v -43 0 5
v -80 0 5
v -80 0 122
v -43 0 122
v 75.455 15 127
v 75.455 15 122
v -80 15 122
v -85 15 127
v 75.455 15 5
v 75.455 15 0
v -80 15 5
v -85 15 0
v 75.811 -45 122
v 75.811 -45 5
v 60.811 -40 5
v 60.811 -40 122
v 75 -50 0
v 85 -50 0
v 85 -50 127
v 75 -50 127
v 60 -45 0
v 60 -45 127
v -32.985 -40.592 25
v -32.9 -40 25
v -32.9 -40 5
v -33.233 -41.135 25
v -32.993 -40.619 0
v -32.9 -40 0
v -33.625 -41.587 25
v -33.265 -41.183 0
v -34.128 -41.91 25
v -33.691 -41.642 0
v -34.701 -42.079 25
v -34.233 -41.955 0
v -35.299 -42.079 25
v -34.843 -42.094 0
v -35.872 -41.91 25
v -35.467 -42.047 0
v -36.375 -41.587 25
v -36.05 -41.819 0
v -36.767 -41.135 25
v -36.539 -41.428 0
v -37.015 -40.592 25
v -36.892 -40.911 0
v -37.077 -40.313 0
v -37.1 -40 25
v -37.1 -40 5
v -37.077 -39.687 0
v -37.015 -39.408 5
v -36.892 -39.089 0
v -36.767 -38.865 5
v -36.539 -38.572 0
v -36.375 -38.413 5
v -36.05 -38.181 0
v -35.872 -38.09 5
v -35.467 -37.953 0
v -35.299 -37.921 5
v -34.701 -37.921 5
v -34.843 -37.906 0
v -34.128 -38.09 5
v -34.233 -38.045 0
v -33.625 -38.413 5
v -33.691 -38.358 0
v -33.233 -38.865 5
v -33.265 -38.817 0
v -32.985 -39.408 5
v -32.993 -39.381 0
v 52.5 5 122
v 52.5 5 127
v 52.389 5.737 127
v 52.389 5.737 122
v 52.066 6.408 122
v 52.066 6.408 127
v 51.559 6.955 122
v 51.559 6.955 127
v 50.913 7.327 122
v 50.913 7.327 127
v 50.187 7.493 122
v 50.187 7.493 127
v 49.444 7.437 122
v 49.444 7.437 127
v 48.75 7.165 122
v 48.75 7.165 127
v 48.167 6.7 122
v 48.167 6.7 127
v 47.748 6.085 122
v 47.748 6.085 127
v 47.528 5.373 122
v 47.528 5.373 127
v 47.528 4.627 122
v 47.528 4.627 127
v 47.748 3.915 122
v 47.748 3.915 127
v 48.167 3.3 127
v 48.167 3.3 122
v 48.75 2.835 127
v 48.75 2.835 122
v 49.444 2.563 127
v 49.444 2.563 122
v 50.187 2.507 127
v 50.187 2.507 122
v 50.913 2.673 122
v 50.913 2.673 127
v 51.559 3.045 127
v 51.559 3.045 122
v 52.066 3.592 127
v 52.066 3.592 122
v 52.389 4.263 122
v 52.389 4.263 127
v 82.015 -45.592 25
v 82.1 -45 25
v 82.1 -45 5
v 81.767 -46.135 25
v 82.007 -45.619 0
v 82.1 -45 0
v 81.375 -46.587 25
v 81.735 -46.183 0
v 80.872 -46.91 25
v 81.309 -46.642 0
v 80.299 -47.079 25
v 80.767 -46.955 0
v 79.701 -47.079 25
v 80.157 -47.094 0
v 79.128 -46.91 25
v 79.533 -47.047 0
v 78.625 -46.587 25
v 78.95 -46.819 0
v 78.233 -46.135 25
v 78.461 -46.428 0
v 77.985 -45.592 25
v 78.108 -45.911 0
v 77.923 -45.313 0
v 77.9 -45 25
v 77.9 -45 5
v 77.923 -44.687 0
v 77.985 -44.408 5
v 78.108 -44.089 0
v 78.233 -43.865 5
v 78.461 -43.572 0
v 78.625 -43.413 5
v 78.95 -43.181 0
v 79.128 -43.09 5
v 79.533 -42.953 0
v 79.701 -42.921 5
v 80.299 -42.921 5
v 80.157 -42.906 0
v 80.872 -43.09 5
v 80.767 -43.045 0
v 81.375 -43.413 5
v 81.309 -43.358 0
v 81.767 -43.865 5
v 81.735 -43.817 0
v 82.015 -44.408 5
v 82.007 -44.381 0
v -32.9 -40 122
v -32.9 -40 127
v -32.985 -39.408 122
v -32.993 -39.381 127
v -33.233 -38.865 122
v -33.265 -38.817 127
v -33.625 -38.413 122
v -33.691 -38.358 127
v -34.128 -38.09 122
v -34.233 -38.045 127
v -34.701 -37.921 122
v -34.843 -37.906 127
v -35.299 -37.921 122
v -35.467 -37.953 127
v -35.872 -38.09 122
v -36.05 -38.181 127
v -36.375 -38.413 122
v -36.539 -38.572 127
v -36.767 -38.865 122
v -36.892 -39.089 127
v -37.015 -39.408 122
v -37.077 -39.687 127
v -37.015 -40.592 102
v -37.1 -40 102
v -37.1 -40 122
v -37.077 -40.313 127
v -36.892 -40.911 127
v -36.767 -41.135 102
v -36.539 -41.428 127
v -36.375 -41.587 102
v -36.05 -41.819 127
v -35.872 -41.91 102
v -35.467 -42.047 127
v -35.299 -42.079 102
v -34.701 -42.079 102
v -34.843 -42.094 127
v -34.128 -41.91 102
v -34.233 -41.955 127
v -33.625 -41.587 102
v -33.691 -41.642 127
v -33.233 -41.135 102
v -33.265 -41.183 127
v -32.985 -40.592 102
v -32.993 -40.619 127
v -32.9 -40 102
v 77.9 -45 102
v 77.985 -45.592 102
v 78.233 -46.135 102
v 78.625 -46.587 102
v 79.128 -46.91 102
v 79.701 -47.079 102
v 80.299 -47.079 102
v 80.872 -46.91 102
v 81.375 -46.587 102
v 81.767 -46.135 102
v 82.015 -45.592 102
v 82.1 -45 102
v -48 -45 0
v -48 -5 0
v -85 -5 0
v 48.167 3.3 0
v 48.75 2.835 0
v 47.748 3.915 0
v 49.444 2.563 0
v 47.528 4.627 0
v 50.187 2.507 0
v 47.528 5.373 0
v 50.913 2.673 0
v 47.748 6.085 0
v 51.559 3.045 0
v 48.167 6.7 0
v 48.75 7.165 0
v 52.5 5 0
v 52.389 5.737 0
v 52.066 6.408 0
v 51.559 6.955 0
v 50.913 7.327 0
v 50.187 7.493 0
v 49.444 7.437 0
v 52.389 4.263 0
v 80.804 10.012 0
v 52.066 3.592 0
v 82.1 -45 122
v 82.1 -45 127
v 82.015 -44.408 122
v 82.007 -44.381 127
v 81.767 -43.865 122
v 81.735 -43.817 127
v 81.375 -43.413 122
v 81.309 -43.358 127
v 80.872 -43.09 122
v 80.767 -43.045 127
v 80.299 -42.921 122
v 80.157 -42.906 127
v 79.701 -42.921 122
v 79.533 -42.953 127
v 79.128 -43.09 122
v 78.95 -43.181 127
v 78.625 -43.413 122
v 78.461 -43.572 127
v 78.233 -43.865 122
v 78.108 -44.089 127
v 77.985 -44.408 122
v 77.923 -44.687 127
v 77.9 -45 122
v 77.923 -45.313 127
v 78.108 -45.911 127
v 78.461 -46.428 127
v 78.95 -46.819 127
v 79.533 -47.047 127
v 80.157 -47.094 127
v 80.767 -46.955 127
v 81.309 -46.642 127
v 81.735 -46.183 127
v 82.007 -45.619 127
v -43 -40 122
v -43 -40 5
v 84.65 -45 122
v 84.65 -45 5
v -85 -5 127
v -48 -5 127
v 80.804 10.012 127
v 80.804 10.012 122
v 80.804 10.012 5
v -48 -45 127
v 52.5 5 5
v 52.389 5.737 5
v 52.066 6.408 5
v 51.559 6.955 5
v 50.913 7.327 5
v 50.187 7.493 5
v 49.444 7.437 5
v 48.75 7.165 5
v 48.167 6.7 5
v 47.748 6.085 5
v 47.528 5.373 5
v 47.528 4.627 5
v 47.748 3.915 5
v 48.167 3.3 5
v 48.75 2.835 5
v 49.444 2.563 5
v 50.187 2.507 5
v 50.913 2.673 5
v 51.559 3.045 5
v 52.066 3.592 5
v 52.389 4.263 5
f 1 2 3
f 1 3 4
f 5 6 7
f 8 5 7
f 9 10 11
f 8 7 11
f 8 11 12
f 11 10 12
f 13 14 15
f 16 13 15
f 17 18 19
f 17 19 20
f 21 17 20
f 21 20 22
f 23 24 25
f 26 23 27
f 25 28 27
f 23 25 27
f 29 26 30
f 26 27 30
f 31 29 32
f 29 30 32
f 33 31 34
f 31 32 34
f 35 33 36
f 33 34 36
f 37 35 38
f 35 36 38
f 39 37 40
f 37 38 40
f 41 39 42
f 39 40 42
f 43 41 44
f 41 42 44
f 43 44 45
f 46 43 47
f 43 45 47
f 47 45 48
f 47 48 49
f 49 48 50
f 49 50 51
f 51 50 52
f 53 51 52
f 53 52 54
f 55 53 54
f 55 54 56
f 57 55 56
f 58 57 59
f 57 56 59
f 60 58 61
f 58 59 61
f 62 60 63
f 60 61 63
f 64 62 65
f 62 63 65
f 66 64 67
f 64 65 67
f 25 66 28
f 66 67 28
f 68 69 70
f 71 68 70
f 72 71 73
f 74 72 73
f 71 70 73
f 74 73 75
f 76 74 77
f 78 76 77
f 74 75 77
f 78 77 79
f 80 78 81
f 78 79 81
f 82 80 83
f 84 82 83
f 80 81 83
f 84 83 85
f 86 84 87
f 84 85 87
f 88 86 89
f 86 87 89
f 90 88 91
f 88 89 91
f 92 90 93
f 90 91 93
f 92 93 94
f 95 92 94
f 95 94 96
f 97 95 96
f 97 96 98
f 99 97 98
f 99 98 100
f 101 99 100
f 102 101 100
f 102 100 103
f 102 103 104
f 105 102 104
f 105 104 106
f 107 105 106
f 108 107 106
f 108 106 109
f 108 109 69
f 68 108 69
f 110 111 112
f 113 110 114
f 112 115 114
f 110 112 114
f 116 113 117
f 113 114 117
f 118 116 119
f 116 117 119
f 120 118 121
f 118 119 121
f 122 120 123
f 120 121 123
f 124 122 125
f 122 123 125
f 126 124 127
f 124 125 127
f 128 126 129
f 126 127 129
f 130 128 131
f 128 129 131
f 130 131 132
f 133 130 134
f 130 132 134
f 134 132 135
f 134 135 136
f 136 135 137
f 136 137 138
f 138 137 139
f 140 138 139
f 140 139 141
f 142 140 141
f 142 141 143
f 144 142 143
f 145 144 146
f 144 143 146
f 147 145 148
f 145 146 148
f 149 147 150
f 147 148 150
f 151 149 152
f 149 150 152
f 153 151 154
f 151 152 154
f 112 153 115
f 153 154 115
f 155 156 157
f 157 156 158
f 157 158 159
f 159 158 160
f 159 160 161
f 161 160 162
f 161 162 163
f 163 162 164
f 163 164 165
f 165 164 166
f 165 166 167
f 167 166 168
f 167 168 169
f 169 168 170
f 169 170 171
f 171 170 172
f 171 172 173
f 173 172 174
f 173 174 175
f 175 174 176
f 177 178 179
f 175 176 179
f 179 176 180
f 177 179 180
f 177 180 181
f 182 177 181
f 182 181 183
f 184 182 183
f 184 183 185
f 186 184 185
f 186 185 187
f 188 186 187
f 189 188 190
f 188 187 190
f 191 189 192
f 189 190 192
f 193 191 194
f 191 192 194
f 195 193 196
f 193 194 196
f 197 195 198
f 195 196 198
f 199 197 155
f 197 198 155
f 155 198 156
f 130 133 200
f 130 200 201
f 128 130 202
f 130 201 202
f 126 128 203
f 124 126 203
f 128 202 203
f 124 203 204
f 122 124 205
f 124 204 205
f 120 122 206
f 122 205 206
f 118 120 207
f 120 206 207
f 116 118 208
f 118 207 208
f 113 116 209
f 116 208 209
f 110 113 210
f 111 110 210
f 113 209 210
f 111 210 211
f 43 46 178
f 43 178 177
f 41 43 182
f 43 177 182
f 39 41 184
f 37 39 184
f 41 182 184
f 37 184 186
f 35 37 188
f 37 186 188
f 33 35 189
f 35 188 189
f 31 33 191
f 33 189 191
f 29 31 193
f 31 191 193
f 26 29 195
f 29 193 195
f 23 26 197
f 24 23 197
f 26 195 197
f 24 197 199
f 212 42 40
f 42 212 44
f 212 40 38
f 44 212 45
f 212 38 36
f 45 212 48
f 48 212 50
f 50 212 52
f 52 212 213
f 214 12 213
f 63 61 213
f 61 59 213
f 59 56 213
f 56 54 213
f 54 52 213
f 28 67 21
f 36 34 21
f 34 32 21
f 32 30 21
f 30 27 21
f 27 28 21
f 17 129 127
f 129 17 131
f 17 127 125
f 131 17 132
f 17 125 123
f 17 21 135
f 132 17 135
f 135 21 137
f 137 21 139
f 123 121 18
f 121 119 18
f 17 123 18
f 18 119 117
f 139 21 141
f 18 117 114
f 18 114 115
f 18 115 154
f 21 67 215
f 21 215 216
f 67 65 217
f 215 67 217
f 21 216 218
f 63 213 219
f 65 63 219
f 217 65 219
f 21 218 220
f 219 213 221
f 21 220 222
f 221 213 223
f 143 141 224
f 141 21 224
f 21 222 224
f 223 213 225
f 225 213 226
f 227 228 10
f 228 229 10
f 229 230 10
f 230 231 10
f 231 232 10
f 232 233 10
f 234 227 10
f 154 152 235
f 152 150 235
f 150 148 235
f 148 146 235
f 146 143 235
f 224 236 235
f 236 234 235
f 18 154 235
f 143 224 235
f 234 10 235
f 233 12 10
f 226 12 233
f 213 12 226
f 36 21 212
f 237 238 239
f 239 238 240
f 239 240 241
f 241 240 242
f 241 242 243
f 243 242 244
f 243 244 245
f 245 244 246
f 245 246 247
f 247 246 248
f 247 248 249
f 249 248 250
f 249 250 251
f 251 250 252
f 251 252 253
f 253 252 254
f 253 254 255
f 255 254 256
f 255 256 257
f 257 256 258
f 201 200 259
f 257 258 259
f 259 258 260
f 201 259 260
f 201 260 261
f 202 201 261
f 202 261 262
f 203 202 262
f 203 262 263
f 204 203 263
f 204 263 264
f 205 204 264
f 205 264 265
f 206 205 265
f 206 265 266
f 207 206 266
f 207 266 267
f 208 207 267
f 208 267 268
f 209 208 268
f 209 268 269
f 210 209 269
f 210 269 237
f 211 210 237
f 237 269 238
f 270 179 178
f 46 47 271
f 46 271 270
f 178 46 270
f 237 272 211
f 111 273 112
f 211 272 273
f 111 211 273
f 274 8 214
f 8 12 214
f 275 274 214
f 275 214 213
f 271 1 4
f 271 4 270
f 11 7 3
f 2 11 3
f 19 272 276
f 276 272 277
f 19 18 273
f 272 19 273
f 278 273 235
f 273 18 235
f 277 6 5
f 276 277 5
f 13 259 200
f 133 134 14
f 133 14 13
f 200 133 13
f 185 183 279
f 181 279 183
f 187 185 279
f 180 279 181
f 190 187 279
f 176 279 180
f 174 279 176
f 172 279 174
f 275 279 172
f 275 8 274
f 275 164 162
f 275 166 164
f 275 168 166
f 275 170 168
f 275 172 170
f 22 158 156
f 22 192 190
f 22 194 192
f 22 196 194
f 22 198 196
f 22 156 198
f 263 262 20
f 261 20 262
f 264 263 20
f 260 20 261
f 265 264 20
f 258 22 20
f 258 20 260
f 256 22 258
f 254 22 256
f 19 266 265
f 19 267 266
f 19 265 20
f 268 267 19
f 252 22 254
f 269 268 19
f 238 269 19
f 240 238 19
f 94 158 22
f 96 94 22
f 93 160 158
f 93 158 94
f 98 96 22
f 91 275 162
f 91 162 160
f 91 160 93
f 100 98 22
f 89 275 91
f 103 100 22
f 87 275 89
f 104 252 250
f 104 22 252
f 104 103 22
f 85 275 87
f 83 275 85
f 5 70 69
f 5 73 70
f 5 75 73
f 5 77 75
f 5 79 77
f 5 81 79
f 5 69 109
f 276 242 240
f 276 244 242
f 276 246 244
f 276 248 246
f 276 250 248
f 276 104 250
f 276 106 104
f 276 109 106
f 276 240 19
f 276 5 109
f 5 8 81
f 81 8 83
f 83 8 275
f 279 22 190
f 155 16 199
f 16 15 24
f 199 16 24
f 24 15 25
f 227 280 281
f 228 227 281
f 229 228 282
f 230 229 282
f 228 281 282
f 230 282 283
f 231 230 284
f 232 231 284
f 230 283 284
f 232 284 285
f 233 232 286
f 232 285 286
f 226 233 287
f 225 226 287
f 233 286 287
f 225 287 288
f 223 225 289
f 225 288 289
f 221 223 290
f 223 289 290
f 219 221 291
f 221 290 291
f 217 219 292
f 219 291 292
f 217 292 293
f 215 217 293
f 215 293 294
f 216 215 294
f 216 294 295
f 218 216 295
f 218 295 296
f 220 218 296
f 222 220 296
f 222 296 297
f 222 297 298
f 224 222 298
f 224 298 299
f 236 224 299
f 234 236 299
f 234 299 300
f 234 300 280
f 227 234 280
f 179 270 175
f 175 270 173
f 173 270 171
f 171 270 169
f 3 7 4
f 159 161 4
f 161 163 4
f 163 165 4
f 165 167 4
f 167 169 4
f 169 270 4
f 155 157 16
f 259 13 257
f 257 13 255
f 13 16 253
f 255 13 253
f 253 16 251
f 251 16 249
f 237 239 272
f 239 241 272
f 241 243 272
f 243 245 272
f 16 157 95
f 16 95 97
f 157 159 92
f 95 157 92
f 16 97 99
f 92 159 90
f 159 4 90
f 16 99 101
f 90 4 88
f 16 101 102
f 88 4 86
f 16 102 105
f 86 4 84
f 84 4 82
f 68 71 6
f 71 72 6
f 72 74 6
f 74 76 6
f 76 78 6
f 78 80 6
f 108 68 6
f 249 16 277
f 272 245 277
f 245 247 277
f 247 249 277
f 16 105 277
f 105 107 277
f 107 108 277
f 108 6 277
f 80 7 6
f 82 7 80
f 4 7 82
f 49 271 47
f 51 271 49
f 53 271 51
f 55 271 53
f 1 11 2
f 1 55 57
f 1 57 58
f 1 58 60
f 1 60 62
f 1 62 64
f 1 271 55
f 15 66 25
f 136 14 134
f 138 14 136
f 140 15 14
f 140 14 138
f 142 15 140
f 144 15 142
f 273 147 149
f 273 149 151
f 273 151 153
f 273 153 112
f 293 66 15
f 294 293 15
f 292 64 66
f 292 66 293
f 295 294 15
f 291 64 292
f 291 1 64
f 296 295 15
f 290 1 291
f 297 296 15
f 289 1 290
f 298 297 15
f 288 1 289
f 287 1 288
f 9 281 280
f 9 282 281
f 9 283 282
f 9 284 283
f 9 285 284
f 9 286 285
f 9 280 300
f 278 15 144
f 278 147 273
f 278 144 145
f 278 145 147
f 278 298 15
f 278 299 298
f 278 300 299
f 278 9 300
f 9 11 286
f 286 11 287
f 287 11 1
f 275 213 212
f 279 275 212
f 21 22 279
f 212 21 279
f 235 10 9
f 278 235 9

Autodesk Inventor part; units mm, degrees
ref_plane "YZ Plane" through (0, 0, 0) normal (1, 0, 0) x (0, 1, 0)
ref_plane "XZ Plane" through (0, 0, 0) normal (0, 1, 0) x (-1, 0, 0)
sketch "Sketch1" plane through (0, 0, 0) normal (0, 0, 1) x (1, 0, 0)
  line L0 (-85, -15) -> (85, -15)
  line L1 (85, -15) -> (85, 15)
  line L2 (85, 15) -> (-85, 15)
  line L3 (-85, 15) -> (-85, -15)
  line L4 (-85, -15) -> (85, 15) construction
  line L5 (85, -15) -> (-85, 15) construction
  circle A0 centre (-35, -40) radius 2.1
  circle A1 centre (80, -45) radius 2.1
  line L6 (85, -50) -> (75, -50)
  line L7 (75, -50) -> (75, -15) construction
  line L8 (75, -15) -> (85, -15)
  line L9 (85, -15) -> (85, -50)
  line L10 (85, -50) -> (75, -15) construction
  line L11 (75, -50) -> (85, -15) construction
  line L12 (-32.5, -15) -> (-47.5, -15)
  line L13 (-48, -15) -> (75, -15)
  line L14 (75, -45) -> (-48, -45)
  line L15 (-48, -45) -> (-48, -15)
  line L16 (-85, -5) -> (-48, -5)
  line L17 (-48, -5) -> (-48, -15)
  line L18 (85, -50) -> (80.4548, 15)
  line L19 (75, -50) -> (60, -45)
  point P0 (0, 0)
  point P1 (80, -32.5)
  point P2 (85, -15)
  point P3 (12.5, -15)
  point P4 (7.5, -15)
  point P5 (-47.5, -15)
  point P6 (-48, -15)
  point P7 (82.5526, -15)
  dimension "d0" = 170
  dimension "d1" = 30
  dimension "d2" = 4.2
  dimension "d5" = 4.2
  dimension "d7" = 5
  dimension "d10" = 30
  dimension "d14" = 13
  dimension "d15" = 30
  dimension "d18" = 25
  dimension "d19" = 35
  dimension "d20" = 20
  dimension "d21" = 37
  dimension "d36" = 4
  dimension "d43" = 15
extrude "Extrusion1" add sketch "Sketch1" along normal blind 127 contours L17 L16 L3 L2 L18 L0 | L0 L18 L6 L19 L14 L15 | A0 | A1
shell "Shell3" thickness 5 removed faces 2 at (83.4849, -28.3333, 42.3333) at (25.3032, 15, 42.3333)
extrude "Extrusion2" cut sketch "Sketch1" along normal blind 25 contours A0 | A1
sketch "Sketch2" plane through (0, 0, 127) normal (0, 0, 1) x (1, 0, 0)
  circle A0 centre (50, 5) radius 2.5
  line L0 (-85, 15) -> (-85, -5) construction
  line L1 (80.4548, 15) -> (-85, 15) construction
  line L2 (-48, -45) -> (60, -45) projected
  line L3 (60, -45) -> (75, -50) projected
  line L4 (75, -50) -> (85, -50) projected
  line L5 (85, -50) -> (80.4548, 15) projected
  line L6 (-85, -5) -> (-48, -5) projected
  line L7 (-48, -5) -> (-48, -45) projected
  point P0 (0, 0)
  dimension "d22" = 5
  dimension "d24" = 10
ref_plane "Work Plane1" through (0, 0, 63.5) normal (0, 0, -1) x (-1, 0, 0)
mirror "Mirror1" about plane through (0, 0, 63.5) normal (0, 0, -1) of "Extrusion2"
extrude "Extrusion4" cut sketch "Sketch2" against normal through all
chamfer "Chamfer2" distance 5 angle 45 2 edges at (80.4548, 15, 124.5) (80.4548, 15, 2.5)
sketch "Sketch3" plane through (0, 0, 127) normal (0, 0, 1) x (1, 0, 0)
  circle A0 centre (-35, -40) radius 2.1 projected
  circle A1 centre (80, -45) radius 2.1 projected
  point P0 (0, 0)
extrude "Extrusion5" cut sketch "Sketch3" against normal through all
equation "\"d5\" = d2"
properties part number "bed"
